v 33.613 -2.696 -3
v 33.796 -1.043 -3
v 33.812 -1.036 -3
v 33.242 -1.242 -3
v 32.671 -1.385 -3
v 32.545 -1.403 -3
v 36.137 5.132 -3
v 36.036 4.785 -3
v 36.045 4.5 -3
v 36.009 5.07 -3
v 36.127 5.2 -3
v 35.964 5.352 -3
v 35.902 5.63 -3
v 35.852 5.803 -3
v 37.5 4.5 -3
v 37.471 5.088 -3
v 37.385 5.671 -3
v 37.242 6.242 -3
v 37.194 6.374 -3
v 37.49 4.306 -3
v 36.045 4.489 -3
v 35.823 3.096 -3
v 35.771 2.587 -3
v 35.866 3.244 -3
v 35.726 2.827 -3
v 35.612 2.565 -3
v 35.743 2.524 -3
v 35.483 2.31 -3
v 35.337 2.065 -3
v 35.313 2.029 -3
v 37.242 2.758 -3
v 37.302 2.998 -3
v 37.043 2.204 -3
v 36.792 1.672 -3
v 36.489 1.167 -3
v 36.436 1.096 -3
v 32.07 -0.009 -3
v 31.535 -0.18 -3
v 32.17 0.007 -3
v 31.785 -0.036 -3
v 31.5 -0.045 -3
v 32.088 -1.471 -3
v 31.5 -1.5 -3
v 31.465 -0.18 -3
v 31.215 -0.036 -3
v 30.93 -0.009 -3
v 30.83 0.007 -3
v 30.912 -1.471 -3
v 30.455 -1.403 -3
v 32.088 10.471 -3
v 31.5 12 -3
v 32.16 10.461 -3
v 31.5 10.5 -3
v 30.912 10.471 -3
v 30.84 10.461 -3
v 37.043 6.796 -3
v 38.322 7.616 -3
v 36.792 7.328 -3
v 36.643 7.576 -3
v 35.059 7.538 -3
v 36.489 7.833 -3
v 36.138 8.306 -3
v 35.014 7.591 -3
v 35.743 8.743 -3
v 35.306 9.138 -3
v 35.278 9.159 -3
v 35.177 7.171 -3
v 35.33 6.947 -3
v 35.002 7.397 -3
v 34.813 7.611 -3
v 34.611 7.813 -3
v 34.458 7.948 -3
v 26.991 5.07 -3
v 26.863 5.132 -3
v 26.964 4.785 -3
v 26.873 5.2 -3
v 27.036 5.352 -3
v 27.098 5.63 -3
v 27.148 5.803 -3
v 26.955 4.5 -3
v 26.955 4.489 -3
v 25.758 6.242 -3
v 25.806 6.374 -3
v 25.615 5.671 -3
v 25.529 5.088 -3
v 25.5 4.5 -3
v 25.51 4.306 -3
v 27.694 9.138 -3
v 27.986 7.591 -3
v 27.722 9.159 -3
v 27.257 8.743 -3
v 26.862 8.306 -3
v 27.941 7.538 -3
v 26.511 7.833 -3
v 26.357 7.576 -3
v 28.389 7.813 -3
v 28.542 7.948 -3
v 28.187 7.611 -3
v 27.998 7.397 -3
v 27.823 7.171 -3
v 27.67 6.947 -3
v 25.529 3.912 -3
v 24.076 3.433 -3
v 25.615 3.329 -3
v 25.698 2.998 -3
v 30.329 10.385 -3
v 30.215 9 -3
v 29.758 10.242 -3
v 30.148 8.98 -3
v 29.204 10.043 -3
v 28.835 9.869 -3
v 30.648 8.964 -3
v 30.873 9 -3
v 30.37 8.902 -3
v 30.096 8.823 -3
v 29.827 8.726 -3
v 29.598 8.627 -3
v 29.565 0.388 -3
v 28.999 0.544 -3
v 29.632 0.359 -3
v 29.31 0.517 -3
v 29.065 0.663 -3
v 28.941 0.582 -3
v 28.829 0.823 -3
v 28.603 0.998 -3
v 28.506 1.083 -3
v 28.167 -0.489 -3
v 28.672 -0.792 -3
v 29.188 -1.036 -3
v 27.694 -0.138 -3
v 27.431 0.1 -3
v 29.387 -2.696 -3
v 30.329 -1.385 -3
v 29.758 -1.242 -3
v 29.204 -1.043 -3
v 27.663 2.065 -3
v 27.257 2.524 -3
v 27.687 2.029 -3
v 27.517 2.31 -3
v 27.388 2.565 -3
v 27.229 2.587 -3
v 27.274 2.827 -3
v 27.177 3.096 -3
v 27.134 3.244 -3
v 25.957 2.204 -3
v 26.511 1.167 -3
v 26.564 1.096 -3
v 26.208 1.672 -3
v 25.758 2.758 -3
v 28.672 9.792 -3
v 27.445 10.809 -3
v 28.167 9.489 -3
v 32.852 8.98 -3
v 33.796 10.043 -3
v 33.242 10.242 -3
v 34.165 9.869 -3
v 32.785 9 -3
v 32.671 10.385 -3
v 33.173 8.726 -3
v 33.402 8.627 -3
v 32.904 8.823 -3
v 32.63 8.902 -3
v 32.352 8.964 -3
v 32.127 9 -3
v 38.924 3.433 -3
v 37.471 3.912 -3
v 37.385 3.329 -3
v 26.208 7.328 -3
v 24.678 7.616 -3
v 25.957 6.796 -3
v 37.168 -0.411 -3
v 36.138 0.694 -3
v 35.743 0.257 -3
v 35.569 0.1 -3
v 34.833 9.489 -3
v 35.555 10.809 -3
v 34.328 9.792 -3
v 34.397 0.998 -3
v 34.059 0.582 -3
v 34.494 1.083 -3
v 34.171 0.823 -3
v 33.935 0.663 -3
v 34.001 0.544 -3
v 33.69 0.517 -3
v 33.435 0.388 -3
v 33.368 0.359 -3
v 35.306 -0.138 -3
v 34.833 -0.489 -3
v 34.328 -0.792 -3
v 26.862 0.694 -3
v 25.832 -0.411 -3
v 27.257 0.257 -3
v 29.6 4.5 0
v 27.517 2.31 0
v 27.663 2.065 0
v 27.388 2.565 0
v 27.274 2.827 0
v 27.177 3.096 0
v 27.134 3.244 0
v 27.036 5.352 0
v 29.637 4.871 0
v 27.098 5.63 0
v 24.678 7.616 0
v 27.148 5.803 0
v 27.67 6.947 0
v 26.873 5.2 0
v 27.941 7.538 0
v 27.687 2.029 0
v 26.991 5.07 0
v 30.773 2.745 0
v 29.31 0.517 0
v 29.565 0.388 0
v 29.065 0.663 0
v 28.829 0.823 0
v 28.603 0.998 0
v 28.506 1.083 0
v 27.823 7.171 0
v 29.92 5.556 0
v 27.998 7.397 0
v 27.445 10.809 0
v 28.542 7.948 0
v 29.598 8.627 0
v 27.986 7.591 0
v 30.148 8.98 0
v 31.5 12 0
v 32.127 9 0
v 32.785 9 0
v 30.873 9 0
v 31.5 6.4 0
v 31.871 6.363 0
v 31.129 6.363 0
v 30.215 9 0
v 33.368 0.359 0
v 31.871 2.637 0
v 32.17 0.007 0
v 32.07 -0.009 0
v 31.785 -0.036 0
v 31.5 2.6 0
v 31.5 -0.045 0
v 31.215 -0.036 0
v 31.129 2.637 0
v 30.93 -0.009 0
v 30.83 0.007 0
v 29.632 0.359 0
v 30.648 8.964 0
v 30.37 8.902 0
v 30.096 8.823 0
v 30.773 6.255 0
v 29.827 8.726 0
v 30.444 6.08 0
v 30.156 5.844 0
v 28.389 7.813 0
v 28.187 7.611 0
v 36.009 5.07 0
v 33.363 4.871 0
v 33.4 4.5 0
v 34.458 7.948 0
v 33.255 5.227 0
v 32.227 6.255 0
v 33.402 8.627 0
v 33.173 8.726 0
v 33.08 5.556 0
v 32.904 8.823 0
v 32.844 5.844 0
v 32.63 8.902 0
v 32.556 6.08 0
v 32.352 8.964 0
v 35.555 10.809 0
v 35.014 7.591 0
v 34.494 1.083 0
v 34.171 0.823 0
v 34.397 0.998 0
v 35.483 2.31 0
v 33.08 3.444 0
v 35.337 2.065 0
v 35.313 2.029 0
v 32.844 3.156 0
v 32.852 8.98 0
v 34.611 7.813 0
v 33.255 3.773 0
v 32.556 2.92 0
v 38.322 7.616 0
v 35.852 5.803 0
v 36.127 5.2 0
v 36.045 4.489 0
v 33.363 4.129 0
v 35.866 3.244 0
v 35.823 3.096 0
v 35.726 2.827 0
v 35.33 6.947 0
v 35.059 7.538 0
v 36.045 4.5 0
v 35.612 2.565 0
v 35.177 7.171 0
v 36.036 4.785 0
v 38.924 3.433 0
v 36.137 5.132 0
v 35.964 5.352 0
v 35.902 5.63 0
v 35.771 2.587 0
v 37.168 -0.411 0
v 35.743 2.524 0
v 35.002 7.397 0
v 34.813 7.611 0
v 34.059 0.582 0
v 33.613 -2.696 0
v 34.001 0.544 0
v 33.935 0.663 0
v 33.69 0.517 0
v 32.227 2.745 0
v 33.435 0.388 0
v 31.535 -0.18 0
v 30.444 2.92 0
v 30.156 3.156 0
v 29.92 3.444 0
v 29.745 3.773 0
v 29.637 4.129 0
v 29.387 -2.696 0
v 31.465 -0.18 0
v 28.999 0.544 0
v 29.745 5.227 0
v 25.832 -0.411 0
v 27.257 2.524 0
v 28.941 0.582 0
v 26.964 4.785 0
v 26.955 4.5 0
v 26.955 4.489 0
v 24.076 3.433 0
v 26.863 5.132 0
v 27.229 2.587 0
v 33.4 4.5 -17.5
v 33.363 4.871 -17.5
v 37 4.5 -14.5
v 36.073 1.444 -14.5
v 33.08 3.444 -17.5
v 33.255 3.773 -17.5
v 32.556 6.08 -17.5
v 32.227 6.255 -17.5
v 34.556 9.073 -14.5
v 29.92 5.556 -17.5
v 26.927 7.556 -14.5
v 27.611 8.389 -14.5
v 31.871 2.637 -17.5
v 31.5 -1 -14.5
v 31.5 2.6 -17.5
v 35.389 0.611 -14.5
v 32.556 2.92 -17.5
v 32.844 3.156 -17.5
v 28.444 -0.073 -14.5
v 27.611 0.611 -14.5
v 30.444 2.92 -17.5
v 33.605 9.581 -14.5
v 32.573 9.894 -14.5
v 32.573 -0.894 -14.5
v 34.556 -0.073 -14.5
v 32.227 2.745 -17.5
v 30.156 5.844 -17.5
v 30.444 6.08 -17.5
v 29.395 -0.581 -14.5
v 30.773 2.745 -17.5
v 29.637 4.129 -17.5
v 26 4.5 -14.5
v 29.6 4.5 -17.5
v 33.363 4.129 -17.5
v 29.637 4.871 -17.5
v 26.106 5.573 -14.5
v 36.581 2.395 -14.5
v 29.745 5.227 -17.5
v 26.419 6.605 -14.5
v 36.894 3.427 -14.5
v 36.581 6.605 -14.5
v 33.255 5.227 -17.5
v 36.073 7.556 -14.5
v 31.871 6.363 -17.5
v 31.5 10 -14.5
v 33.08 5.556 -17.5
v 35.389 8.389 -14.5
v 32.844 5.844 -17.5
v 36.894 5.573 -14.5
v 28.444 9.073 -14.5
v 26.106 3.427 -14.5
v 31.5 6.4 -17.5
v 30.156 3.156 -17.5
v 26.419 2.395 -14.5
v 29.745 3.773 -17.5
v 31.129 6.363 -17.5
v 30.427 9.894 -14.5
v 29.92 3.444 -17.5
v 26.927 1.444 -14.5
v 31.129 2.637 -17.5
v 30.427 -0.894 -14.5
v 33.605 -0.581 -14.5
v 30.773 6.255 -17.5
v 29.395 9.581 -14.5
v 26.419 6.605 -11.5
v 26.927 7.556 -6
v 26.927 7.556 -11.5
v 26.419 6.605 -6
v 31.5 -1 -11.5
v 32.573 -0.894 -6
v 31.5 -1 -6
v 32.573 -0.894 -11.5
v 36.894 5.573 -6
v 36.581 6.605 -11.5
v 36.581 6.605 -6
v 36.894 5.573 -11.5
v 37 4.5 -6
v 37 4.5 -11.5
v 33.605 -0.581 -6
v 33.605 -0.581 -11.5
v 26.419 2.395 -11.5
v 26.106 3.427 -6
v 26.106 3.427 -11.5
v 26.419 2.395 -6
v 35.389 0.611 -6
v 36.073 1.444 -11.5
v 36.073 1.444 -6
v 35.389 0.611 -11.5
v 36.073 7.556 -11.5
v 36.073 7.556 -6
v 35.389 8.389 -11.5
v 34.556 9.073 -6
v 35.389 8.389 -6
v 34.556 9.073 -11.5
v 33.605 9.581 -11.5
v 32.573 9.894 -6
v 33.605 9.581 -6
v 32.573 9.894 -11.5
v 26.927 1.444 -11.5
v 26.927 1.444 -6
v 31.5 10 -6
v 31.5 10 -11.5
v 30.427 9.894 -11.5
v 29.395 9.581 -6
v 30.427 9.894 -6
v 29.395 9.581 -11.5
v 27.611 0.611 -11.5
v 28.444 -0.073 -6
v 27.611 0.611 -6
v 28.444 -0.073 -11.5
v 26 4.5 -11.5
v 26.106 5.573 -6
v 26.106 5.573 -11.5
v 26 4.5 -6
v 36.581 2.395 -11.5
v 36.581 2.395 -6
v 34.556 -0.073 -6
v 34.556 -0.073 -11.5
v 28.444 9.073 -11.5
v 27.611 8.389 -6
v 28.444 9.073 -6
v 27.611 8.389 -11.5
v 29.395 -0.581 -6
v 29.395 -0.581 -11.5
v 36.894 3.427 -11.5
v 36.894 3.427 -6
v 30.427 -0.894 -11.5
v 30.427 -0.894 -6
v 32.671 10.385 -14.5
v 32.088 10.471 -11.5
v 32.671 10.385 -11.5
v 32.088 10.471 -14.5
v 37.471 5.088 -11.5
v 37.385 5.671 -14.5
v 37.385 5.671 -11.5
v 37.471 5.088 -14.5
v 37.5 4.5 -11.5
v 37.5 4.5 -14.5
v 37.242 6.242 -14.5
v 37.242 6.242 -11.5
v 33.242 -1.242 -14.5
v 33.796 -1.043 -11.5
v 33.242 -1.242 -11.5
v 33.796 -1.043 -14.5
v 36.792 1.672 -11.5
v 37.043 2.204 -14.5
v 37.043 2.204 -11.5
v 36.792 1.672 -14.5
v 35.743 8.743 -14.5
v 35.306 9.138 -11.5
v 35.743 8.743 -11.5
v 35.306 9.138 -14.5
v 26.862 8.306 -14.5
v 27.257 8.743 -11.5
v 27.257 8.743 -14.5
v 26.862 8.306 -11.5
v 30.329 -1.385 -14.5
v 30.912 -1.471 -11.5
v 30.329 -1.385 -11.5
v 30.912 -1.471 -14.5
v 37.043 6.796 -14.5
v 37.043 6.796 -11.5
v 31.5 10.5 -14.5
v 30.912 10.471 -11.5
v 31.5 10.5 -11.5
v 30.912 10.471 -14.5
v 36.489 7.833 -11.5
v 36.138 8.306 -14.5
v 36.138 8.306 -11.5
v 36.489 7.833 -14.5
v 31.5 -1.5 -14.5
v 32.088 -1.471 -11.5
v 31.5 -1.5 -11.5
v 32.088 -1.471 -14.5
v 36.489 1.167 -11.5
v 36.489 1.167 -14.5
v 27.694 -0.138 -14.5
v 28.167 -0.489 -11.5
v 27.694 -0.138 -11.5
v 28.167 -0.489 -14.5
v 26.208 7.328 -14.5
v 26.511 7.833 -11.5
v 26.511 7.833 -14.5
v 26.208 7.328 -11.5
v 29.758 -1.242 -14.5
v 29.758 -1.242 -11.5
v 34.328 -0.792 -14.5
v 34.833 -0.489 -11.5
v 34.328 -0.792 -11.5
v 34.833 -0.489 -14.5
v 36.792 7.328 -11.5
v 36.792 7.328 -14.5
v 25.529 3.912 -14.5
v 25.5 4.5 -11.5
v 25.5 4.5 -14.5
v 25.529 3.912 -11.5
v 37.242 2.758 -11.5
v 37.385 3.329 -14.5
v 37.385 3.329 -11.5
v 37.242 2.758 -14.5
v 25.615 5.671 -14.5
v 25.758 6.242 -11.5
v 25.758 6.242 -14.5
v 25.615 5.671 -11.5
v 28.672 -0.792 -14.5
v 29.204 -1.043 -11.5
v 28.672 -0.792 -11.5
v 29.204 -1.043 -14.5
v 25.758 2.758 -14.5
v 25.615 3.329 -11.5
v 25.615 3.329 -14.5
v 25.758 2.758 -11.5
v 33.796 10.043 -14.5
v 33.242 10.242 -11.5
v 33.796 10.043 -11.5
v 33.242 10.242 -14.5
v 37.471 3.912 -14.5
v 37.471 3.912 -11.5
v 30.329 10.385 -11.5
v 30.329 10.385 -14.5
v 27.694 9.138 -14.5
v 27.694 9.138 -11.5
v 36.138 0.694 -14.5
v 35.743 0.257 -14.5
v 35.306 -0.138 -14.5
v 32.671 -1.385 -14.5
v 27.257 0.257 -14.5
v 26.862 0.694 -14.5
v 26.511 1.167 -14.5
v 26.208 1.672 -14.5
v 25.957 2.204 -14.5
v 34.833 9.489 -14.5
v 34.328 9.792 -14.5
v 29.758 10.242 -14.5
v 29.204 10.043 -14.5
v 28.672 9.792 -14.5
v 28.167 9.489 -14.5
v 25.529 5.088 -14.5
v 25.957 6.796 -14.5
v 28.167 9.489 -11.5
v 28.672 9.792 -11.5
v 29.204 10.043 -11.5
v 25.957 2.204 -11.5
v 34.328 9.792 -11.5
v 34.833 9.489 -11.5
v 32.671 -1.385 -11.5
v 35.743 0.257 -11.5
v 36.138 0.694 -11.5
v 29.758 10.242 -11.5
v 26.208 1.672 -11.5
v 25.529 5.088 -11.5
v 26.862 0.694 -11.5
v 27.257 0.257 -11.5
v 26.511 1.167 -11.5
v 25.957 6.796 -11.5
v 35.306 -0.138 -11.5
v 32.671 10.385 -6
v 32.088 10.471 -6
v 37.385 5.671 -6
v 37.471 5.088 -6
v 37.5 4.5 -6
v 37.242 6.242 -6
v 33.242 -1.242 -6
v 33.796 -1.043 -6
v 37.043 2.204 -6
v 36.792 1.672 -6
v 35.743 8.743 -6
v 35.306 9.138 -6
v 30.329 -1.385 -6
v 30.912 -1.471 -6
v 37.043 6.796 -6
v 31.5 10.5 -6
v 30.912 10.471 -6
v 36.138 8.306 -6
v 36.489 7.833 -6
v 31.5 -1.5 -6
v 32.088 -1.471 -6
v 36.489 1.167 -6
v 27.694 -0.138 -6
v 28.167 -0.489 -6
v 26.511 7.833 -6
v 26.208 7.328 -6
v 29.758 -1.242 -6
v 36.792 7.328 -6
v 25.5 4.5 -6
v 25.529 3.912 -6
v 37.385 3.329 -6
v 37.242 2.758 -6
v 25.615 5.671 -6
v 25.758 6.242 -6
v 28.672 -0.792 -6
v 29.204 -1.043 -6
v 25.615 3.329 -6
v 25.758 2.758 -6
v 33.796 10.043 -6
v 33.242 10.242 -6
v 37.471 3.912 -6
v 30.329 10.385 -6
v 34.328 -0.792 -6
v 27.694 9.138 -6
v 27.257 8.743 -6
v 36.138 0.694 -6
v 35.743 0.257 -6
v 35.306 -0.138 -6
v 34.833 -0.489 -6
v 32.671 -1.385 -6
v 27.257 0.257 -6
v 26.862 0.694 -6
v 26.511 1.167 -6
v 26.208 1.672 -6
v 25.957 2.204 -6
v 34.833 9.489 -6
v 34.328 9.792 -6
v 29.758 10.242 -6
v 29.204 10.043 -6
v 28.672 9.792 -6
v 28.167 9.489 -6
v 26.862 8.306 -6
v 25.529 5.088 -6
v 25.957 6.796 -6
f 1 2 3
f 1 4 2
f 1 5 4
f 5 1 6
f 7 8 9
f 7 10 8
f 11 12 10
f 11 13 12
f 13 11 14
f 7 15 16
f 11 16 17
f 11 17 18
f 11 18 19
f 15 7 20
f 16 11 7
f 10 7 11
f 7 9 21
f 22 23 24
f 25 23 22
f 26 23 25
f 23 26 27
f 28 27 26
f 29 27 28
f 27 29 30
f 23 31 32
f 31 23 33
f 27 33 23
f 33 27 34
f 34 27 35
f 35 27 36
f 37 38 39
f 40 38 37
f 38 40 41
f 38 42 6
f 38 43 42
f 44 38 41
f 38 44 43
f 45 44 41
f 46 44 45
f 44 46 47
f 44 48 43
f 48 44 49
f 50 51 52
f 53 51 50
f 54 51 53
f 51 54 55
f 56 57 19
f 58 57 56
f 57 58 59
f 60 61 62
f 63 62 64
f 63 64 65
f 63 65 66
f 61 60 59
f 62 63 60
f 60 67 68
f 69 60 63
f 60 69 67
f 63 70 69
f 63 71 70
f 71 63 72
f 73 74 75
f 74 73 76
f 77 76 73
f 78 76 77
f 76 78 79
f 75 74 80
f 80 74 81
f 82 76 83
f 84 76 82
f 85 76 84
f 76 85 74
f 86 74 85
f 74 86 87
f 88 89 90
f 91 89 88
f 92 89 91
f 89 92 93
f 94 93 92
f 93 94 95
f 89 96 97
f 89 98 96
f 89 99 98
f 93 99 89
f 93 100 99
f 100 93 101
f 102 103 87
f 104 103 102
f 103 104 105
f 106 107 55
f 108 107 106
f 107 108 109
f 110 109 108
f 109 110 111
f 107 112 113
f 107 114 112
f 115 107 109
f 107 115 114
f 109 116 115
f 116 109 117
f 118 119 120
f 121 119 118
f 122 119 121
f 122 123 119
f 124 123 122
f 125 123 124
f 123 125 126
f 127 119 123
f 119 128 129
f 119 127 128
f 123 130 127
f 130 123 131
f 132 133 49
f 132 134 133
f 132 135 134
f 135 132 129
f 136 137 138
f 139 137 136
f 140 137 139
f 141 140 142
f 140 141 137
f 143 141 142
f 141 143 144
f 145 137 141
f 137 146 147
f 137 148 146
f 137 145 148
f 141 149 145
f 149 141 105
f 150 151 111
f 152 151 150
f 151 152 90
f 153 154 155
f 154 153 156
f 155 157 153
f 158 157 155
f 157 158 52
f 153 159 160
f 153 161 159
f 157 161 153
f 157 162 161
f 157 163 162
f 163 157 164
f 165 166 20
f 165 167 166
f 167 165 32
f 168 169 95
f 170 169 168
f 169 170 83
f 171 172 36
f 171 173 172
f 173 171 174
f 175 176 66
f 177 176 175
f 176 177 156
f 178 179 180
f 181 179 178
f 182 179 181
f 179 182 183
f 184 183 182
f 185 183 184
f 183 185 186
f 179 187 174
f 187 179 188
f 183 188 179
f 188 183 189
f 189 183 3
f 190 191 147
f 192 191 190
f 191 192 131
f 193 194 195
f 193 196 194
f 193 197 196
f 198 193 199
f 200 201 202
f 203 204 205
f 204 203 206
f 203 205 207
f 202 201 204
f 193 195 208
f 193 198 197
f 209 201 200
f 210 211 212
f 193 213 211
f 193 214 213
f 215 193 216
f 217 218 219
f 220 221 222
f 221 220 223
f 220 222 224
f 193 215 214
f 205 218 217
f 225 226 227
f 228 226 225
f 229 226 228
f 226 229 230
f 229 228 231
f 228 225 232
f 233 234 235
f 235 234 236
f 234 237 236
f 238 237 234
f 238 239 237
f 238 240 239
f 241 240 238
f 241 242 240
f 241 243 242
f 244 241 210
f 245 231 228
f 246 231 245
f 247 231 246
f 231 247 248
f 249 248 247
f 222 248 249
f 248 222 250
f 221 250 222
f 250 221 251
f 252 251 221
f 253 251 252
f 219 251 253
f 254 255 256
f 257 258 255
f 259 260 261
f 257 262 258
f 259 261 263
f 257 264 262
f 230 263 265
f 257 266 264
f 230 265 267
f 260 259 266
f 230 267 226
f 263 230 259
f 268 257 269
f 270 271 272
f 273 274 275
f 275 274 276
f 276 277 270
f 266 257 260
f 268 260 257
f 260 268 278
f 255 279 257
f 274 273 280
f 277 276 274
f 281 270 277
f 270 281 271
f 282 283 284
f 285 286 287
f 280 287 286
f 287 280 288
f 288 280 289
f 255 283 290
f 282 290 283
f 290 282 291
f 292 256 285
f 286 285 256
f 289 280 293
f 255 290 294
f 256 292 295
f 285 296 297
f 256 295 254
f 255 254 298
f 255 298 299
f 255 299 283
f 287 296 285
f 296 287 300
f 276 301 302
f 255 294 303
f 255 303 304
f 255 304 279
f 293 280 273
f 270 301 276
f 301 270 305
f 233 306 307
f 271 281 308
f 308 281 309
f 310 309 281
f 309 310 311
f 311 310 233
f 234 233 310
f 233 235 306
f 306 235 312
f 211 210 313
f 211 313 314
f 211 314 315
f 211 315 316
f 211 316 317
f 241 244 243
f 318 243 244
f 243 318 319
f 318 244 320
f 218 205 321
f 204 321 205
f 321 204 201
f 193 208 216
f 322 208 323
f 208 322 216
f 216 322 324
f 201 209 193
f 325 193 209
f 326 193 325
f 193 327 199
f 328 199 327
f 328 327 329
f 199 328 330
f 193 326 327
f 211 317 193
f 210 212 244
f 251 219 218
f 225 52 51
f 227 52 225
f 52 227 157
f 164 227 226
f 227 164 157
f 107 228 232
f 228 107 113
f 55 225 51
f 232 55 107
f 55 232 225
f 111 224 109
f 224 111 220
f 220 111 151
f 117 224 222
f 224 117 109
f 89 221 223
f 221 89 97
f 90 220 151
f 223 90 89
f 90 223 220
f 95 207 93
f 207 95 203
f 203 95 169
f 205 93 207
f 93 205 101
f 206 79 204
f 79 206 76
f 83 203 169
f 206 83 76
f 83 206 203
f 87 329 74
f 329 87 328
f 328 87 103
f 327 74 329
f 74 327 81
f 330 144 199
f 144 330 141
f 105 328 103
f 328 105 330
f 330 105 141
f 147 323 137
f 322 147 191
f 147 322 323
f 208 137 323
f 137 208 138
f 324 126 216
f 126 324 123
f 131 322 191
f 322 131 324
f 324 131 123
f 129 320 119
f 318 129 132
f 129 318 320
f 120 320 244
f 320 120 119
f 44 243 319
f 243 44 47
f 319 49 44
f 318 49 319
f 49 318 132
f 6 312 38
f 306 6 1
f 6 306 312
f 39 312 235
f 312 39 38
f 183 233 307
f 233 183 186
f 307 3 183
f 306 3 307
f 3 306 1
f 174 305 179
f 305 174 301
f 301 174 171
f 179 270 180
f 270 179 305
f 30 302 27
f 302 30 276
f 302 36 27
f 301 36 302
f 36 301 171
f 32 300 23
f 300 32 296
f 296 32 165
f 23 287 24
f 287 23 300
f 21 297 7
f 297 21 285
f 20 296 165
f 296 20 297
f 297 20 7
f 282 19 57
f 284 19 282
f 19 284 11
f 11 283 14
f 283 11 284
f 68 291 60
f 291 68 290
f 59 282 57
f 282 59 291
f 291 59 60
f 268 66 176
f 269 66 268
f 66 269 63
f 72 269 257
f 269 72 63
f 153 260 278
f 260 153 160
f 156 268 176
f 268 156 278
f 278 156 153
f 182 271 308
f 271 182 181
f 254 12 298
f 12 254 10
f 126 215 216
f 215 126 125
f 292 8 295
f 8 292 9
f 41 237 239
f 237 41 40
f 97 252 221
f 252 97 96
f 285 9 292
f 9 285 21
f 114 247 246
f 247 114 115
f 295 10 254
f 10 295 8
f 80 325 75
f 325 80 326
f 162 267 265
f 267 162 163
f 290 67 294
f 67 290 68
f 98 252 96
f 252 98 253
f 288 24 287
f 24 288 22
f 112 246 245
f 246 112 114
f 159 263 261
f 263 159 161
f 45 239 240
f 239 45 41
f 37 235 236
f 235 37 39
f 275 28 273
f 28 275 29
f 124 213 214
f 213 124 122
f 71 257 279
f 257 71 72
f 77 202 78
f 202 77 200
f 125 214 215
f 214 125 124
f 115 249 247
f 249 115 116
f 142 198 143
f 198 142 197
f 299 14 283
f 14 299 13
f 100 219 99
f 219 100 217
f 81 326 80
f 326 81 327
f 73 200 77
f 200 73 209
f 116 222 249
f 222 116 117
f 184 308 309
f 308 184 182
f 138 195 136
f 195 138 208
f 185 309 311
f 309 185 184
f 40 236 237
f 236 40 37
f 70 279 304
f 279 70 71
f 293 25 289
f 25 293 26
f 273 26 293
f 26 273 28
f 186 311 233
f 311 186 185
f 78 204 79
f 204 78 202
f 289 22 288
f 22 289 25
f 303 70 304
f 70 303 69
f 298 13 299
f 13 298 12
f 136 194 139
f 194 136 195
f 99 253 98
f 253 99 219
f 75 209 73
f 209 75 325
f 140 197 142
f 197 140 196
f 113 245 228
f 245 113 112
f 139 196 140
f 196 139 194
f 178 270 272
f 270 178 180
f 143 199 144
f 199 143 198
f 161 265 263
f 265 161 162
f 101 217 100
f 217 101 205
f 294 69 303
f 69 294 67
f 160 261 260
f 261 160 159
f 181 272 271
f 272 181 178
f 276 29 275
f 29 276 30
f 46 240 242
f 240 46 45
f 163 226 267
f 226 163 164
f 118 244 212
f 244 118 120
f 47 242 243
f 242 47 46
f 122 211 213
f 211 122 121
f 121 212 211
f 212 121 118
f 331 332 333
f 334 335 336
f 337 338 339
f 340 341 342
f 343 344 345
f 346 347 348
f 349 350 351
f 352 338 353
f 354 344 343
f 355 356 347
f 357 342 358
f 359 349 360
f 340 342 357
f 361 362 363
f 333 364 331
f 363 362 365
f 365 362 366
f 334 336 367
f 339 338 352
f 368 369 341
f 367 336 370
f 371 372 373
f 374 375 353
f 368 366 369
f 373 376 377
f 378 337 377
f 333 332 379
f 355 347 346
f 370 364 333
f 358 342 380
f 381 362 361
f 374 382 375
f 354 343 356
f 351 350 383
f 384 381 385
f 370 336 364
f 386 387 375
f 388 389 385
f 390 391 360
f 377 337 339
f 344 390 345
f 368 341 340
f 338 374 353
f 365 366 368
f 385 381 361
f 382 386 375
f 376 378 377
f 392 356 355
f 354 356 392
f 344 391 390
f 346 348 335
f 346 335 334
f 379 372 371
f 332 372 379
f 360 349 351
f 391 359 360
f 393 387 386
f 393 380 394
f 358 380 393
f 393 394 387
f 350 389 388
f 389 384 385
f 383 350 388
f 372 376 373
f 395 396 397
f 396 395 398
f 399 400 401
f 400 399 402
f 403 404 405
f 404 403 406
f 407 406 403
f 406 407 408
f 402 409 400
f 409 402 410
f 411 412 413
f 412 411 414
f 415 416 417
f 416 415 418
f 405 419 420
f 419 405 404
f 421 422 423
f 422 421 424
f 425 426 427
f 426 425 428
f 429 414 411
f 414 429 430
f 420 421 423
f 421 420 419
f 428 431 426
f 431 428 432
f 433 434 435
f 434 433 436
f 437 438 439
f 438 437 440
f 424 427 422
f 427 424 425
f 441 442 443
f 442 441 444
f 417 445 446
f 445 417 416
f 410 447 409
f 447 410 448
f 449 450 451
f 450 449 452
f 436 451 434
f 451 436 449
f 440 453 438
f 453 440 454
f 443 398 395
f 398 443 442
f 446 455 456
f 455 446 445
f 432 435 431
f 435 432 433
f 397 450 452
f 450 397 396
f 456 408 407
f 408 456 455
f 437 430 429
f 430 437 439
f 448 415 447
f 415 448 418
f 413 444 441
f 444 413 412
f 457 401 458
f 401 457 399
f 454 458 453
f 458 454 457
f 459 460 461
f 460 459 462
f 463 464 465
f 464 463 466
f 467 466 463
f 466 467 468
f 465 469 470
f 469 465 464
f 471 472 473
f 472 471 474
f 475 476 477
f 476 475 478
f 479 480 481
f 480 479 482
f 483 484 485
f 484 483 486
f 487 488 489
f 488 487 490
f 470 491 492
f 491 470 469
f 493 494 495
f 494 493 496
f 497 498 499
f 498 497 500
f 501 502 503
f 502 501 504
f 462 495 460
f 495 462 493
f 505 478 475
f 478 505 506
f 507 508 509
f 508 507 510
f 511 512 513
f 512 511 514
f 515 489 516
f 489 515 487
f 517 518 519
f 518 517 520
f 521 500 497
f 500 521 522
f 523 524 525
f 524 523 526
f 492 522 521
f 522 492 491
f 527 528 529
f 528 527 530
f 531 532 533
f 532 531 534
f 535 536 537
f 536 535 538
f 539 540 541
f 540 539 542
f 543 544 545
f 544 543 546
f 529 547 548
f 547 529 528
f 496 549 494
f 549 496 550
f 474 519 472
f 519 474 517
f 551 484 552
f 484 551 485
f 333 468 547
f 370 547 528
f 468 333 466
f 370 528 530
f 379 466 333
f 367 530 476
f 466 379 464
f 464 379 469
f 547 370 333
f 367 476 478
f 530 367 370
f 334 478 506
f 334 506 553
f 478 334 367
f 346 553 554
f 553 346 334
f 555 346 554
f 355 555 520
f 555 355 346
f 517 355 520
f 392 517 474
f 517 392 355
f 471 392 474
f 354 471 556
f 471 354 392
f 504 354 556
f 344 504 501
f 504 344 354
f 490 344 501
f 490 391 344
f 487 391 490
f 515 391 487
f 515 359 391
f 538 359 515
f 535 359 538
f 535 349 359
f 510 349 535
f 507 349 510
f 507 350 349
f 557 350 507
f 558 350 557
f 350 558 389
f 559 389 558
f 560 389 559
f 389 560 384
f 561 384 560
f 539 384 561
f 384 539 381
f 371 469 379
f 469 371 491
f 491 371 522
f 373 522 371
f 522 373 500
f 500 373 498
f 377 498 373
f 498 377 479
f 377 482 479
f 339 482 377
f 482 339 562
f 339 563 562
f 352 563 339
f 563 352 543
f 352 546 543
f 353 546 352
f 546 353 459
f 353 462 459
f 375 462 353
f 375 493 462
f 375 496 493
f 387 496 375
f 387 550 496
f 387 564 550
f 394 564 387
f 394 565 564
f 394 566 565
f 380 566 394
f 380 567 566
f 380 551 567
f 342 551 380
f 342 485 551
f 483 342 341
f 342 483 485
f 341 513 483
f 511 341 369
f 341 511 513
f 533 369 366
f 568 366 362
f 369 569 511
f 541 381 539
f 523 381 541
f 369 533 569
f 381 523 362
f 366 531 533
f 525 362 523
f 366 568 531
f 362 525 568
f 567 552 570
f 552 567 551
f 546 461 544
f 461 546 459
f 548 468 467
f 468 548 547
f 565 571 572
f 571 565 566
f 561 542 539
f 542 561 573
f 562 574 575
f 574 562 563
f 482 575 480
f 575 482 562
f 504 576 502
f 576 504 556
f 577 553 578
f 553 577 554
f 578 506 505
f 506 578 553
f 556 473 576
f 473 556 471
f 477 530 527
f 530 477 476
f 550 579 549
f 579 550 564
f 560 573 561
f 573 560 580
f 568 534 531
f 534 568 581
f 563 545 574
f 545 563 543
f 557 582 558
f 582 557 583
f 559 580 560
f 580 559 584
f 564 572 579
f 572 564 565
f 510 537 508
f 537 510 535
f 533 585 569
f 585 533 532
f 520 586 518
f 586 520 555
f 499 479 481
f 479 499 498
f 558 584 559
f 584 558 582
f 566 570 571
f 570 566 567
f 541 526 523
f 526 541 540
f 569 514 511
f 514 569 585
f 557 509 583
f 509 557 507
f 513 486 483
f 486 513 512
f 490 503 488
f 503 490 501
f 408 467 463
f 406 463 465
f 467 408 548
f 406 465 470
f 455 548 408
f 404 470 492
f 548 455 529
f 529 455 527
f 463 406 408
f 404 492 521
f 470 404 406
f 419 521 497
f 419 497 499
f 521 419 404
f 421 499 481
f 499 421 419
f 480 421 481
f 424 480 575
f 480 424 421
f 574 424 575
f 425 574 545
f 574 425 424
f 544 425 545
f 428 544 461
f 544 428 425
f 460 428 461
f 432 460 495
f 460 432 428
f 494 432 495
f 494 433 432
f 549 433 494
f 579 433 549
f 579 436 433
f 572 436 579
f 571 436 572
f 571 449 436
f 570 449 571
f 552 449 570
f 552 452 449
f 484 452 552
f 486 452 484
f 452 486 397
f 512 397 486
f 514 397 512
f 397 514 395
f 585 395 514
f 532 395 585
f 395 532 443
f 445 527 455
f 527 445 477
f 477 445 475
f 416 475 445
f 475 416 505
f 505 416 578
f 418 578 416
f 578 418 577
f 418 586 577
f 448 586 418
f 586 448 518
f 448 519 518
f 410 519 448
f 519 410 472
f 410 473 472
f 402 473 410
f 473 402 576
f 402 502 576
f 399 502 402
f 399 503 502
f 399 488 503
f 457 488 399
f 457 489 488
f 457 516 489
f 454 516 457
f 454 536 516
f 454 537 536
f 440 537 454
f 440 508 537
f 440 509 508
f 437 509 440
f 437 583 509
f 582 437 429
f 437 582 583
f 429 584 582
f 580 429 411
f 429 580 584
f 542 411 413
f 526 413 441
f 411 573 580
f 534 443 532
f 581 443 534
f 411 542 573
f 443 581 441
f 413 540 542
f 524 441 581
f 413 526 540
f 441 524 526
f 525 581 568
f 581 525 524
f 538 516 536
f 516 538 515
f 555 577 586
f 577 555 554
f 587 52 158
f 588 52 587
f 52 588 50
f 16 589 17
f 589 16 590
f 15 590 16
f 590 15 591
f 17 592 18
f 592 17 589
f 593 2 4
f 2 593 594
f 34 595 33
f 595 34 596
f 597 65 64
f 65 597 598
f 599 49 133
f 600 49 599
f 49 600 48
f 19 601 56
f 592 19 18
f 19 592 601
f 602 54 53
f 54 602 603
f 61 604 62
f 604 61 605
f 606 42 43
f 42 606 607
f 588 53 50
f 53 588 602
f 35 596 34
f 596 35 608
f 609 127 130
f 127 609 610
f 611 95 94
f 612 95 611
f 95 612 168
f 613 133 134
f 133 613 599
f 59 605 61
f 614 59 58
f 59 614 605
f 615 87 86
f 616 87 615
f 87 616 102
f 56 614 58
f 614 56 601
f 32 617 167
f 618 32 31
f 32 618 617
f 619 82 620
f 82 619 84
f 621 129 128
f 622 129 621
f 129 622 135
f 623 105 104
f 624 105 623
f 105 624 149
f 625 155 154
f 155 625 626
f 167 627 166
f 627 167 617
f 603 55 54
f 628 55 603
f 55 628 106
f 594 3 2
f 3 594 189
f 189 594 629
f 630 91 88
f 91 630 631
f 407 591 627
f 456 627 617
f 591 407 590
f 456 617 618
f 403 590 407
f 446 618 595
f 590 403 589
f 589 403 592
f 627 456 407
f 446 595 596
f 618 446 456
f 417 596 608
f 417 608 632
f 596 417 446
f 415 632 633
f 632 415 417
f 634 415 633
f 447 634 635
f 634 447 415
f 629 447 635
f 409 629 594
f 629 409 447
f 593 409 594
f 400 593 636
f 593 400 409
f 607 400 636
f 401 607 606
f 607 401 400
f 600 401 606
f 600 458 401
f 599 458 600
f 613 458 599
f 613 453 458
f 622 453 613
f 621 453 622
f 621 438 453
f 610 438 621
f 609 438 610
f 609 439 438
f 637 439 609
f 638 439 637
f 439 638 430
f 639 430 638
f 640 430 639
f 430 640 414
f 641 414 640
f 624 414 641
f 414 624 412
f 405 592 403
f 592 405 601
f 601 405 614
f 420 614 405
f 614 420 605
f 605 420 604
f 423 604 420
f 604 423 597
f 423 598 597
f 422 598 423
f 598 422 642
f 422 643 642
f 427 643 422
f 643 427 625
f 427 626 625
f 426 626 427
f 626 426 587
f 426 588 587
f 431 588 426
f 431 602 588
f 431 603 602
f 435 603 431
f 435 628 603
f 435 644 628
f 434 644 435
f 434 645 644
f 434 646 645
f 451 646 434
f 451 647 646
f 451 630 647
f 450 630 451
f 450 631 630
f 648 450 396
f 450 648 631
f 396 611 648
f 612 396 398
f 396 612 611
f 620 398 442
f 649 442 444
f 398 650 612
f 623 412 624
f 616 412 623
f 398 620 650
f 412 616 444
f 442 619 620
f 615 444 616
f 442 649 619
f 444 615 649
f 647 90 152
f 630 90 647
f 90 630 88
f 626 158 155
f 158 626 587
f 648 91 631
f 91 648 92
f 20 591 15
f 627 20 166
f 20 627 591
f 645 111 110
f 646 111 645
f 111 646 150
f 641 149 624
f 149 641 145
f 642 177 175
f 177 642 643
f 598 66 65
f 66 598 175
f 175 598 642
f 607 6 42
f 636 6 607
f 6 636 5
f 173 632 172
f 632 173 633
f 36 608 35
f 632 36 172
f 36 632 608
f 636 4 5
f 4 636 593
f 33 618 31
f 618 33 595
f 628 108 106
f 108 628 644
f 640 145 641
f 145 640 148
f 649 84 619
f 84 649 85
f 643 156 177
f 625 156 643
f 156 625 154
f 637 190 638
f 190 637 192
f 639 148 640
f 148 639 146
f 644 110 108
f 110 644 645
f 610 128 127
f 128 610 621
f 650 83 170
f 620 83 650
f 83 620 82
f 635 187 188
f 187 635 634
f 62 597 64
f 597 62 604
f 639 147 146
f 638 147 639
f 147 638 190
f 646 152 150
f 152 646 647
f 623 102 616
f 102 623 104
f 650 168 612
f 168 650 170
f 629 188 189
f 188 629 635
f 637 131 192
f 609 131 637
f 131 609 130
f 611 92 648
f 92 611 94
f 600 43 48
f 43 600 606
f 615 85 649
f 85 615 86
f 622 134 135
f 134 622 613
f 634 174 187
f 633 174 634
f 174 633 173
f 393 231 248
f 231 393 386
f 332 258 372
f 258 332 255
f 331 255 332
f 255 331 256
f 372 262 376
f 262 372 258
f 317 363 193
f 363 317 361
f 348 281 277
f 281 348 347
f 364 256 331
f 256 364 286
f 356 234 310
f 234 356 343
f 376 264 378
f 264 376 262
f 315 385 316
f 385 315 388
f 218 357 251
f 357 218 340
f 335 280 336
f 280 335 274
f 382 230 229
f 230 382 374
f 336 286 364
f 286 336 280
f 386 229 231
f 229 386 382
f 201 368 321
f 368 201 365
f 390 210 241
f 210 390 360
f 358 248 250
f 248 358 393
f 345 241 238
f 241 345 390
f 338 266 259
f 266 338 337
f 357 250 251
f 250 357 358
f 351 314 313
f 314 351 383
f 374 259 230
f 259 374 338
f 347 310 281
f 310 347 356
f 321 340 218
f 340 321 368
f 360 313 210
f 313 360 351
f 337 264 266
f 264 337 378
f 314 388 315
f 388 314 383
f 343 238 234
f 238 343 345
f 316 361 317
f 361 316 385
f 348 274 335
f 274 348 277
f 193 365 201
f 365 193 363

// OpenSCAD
module wedge(k,b,h) {
	p1 = [ -b/2, 0, 0 ];
	p2 = [ +b/2, 0, 0 ];
	p3 = [ 0, k, 0 ];
	p4 = [ -b/2, 0, h ];
	p5 = [ +b/2, 0, h ];
	p6 = [ 0, k, h ];
	polyhedron(
		points=[p1, p2, p3, p4, p5, p6],
		triangles=[
			[1,0,2],
			[3,4,5],
			[5,1,2],
			[4,1,5],
			[4,0,1],
			[4,3,0],
			[3,5,0],
			[5,2,0],
		]
	);
}

module gear2( r, h ) {
	circumference = 3.1416 * 2 * r;
	t = floor( circumference / 2.5 );
	k = 3;
	union() {
		cylinder( r=1.01*r, h=h, $fn=100 );
		for( a=[0:360/t:360] ) {
			rotate(a,[0,0,1])
			translate([0,r,0])
			//scale([s,1.5*s,1])
			wedge( k, circumference/t, h );
		}
	}
}


br = 3.5/2; // Bolt Radius
mmw = 55+8; // Motor Mount Width
mmd = 48; // Motor Mount Depth
mmh = 9; // Moto Mount Height
mmcr = 13; // Motor Mount Cutout Radius
roh = 30+6; // Roller area Outer Height
rih = roh-mmh-mmh; // Roller area Inner Height
riw = mmw-mmh-mmh; // Roller area Inner Width

/*
// Chassis
difference() {
	union() {
		cube( [ mmw,mmd,mmh] );
		translate( [0,0,-roh+mmh] ) cube( [ mmw,mmh,roh] );
	}

	// Roller cutout
	translate( [mmh,-1,-roh+mmh+mmh] ) cube( [ riw,mmh+2,rih ] );

	// Motor cutout
	translate( [mmw/2,mmd/2,-1] ) cylinder( r=mmcr, h=mmh+2 );

	// Motor bolt holes
	translate([mmw/2,mmd/2,0]) {
		translate( [21,0,-1] ) cylinder( r=br, h=mmh+2, $fn=32 );
		translate( [-21,0,-1] ) cylinder( r=br, h=mmh+2, $fn=32 );
	}

	// Roller holes
	translate( [mmw/2,mmh/2,-roh+mmh-1] ) cylinder( r=br, h=roh+2, $fn=32 );
	translate( [mmw/2+12,mmh/2,-roh+mmh-1] ) cylinder( r=br, h=roh+2, $fn=32 );
}
*/


/*
// Motor (for reference)
translate( [mmw/2,mmd/2,mmh] ) cylinder( r=18, h=17 );
*/

// Roller
rc = 3; // Roller Camber height
rg = 3; // Roller Gear height
rh = rih-0.5; // Roller Height
reh = rh-rc-rc-rg; // Roller Empty Height
rgr = 4.5; // Roller Gear Radius
rr = 5.5; // Roller Radius
rhr = 1.9; // Roller Hole Radius
rs = 12; // Roller Separation
rbr = rs/2; // Roller Block Radius

module roller() {
	translate( [mmw/2,mmh/2,-rh] )
	difference() {
		union() {
			translate([0,0,0]) cylinder( r2=rr, r1=rhr, h=rc, $fn=32 );
			translate([0,0,rc]) cylinder( r=rr, h=rh-rc-rg, $fn=32 );
			translate([0,0,rc+reh+rc]) gear2( rgr, rg );
			translate([0,0,rc]) cylinder( r=rbr, h=3, $fn=64 );
			translate([0,0,reh+rc]) cylinder( r=rbr, h=3, $fn=64 );
		}
		translate([0,0,-1]) cylinder( r=rhr, h=30, $fn=32 );
	}
}
roller();
//translate( [rs,0,0] ) roller();

/*
// Motor gear
translate( [mmw/2,mmd/2,-4] ) 
difference() {
	union() {
		gear2( 12.4, 4 );
		cylinder( r=4, h=5+3, $fn=30 );
	}
	translate([0,0,-1]) cylinder( r=1.8, h=20, $fn=50 );
		// r-2 was too big
		// Was r=1.8, still too small
		// Was 1.6, was too small
}

*/
